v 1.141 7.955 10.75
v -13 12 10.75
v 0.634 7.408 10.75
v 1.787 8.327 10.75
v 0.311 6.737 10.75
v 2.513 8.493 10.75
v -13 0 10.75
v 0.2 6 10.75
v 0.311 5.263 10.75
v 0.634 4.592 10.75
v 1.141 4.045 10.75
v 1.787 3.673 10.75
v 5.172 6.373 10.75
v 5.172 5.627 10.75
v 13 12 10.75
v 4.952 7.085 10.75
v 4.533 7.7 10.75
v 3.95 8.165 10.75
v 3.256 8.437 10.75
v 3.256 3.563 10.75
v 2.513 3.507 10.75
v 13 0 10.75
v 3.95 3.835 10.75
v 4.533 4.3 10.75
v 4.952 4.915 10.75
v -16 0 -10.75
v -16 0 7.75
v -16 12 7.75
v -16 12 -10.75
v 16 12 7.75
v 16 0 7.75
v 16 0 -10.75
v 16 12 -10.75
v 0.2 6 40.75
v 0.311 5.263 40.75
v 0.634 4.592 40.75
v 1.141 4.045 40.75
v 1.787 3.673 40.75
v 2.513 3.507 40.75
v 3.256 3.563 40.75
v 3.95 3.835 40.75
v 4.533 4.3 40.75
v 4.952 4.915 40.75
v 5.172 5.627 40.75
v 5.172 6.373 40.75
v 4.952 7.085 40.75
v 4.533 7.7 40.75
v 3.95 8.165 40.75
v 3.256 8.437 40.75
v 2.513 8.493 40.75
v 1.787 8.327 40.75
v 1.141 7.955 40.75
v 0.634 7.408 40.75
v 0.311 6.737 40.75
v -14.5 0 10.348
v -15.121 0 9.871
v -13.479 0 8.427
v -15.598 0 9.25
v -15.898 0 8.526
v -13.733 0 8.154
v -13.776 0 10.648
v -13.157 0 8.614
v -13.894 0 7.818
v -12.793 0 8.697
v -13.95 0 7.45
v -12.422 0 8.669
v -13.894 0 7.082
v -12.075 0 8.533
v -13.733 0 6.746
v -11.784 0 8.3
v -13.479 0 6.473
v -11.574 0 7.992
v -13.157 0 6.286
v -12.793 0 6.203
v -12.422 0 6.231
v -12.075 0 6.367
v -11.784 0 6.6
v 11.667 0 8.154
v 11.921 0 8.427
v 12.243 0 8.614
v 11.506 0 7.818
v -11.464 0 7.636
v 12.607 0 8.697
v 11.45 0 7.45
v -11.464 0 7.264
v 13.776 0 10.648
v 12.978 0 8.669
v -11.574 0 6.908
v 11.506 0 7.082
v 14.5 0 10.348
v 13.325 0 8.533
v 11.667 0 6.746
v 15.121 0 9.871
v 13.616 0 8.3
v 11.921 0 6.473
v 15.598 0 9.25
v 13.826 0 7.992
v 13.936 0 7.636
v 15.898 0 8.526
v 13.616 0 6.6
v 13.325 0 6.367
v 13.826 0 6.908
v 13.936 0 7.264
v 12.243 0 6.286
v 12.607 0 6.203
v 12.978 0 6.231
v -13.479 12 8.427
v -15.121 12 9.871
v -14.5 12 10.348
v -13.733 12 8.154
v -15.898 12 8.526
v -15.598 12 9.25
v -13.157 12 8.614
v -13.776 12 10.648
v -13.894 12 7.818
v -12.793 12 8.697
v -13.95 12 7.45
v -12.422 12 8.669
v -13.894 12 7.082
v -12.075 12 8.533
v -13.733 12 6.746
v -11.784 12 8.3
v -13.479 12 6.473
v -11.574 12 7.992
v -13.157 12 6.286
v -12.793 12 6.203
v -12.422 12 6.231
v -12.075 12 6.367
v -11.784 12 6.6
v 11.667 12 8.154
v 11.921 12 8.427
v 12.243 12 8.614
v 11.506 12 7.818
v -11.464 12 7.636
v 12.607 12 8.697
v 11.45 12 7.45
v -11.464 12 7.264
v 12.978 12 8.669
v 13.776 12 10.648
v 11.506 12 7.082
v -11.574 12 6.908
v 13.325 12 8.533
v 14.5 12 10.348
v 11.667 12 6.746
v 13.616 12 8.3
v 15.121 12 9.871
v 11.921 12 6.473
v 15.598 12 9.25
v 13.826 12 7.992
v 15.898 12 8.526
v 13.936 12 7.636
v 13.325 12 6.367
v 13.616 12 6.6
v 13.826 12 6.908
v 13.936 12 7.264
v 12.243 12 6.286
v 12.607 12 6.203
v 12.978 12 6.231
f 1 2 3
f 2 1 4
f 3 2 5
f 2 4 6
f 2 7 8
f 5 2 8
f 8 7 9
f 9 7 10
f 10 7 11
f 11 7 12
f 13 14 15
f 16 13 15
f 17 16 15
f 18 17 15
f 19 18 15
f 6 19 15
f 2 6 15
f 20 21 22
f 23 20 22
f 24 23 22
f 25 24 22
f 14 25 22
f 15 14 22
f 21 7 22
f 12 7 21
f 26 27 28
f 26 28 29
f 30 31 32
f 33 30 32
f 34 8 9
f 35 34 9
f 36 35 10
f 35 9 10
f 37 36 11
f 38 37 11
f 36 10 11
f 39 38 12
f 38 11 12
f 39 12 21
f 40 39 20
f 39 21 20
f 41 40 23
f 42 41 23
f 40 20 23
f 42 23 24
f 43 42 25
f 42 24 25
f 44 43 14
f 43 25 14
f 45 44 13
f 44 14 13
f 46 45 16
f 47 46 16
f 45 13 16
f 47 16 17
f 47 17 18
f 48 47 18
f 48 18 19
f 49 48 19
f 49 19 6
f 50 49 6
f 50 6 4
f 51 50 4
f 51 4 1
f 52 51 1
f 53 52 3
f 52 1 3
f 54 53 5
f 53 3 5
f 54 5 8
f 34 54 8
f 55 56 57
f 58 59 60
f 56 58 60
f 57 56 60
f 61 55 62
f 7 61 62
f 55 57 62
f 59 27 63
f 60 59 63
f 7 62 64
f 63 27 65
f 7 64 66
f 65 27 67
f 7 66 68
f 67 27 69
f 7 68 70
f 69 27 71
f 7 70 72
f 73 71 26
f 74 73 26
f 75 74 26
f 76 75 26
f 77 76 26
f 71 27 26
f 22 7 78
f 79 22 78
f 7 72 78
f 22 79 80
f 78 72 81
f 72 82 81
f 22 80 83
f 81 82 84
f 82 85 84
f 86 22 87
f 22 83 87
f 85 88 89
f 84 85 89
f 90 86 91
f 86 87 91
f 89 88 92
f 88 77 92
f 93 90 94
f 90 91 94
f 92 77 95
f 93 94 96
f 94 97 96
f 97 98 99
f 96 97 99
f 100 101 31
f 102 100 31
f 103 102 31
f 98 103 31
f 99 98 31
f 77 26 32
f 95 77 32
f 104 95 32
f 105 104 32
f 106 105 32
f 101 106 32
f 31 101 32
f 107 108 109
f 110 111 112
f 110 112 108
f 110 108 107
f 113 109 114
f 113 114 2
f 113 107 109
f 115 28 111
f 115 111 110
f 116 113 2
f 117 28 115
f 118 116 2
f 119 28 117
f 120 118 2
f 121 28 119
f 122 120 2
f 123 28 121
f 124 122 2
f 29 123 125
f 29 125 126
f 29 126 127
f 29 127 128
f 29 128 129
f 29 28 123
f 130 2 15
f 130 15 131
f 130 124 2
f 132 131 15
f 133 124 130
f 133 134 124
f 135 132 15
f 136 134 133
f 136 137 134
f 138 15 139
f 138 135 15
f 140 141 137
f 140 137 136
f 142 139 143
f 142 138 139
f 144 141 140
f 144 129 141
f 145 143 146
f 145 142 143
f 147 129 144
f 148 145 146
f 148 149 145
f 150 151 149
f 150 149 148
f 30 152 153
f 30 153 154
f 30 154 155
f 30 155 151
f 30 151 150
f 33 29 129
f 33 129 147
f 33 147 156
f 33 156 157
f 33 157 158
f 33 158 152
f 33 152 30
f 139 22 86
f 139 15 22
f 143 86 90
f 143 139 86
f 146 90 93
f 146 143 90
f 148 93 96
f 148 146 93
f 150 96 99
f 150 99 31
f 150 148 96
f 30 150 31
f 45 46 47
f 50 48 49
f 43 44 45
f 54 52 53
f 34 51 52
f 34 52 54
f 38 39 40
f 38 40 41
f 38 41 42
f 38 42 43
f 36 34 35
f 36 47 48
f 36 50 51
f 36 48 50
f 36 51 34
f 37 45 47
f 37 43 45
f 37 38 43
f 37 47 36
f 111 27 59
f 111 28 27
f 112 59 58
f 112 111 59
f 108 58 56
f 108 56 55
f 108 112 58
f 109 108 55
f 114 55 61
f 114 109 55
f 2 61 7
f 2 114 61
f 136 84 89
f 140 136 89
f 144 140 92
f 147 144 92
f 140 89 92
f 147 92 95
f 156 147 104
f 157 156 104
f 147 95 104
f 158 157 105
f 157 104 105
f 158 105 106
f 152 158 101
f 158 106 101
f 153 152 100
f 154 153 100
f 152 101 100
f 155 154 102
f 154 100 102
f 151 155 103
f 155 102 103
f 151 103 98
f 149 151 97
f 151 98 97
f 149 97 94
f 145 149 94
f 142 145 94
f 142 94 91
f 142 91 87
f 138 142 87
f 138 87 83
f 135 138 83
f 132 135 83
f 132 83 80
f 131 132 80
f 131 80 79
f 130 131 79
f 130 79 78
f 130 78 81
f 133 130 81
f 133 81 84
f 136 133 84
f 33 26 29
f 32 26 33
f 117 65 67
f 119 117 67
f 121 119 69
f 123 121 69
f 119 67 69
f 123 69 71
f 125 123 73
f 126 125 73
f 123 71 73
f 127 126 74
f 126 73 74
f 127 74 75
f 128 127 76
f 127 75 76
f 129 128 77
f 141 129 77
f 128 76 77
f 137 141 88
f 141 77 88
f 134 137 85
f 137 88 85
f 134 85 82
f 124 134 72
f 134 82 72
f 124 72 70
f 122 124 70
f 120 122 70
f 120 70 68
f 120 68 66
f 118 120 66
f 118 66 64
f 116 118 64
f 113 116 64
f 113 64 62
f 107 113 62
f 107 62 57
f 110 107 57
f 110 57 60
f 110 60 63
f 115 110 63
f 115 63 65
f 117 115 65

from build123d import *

# Parameters (mm, degrees)
SKETCH_1_W         = 32
SKETCH_1_H         = 21.5
EXTRUDE_1_DEPTH    = 12
HOLE_WIZARD_M3_1_D = 2.5
FILLET_1_R         = 3
SKETCH_4_R         = 2.5
EXTRUDE_2_DEPTH    = 30


with BuildPart() as part:
    # 草图1 → 凸台-拉伸1 (new body)
    with BuildSketch(Plane(origin=(0, 0, 0), x_dir=(1, 0, 0), z_dir=(0, 1, 0))):
        Rectangle(SKETCH_1_W, SKETCH_1_H)
    extrude(amount=EXTRUDE_1_DEPTH)

    # M3 螺纹孔1 (through all)
    with Locations(Plane(origin=(0, 12, 0), x_dir=(1, 0, 0), z_dir=(0, 1, 0))):
        with Locations((-12.7, -7.45), (12.7, -7.45)):
            Hole(HOLE_WIZARD_M3_1_D / 2)

    # 圆角1
    fillet_1_edges = [part.edges().sort_by_distance(p)[0] for p in [
        (16, 6, 10.75),
        (-16, 6, 10.75),
    ]]
    fillet(fillet_1_edges, radius=FILLET_1_R)

    # 草图4 → 凸台-拉伸2 (add)
    with BuildSketch(Plane.XY.offset(10.75)):
        with Locations(Location((2.7, 6, 0), (0, 0, 180))):
            Circle(SKETCH_4_R)
    extrude(amount=EXTRUDE_2_DEPTH)


solid = part.part
